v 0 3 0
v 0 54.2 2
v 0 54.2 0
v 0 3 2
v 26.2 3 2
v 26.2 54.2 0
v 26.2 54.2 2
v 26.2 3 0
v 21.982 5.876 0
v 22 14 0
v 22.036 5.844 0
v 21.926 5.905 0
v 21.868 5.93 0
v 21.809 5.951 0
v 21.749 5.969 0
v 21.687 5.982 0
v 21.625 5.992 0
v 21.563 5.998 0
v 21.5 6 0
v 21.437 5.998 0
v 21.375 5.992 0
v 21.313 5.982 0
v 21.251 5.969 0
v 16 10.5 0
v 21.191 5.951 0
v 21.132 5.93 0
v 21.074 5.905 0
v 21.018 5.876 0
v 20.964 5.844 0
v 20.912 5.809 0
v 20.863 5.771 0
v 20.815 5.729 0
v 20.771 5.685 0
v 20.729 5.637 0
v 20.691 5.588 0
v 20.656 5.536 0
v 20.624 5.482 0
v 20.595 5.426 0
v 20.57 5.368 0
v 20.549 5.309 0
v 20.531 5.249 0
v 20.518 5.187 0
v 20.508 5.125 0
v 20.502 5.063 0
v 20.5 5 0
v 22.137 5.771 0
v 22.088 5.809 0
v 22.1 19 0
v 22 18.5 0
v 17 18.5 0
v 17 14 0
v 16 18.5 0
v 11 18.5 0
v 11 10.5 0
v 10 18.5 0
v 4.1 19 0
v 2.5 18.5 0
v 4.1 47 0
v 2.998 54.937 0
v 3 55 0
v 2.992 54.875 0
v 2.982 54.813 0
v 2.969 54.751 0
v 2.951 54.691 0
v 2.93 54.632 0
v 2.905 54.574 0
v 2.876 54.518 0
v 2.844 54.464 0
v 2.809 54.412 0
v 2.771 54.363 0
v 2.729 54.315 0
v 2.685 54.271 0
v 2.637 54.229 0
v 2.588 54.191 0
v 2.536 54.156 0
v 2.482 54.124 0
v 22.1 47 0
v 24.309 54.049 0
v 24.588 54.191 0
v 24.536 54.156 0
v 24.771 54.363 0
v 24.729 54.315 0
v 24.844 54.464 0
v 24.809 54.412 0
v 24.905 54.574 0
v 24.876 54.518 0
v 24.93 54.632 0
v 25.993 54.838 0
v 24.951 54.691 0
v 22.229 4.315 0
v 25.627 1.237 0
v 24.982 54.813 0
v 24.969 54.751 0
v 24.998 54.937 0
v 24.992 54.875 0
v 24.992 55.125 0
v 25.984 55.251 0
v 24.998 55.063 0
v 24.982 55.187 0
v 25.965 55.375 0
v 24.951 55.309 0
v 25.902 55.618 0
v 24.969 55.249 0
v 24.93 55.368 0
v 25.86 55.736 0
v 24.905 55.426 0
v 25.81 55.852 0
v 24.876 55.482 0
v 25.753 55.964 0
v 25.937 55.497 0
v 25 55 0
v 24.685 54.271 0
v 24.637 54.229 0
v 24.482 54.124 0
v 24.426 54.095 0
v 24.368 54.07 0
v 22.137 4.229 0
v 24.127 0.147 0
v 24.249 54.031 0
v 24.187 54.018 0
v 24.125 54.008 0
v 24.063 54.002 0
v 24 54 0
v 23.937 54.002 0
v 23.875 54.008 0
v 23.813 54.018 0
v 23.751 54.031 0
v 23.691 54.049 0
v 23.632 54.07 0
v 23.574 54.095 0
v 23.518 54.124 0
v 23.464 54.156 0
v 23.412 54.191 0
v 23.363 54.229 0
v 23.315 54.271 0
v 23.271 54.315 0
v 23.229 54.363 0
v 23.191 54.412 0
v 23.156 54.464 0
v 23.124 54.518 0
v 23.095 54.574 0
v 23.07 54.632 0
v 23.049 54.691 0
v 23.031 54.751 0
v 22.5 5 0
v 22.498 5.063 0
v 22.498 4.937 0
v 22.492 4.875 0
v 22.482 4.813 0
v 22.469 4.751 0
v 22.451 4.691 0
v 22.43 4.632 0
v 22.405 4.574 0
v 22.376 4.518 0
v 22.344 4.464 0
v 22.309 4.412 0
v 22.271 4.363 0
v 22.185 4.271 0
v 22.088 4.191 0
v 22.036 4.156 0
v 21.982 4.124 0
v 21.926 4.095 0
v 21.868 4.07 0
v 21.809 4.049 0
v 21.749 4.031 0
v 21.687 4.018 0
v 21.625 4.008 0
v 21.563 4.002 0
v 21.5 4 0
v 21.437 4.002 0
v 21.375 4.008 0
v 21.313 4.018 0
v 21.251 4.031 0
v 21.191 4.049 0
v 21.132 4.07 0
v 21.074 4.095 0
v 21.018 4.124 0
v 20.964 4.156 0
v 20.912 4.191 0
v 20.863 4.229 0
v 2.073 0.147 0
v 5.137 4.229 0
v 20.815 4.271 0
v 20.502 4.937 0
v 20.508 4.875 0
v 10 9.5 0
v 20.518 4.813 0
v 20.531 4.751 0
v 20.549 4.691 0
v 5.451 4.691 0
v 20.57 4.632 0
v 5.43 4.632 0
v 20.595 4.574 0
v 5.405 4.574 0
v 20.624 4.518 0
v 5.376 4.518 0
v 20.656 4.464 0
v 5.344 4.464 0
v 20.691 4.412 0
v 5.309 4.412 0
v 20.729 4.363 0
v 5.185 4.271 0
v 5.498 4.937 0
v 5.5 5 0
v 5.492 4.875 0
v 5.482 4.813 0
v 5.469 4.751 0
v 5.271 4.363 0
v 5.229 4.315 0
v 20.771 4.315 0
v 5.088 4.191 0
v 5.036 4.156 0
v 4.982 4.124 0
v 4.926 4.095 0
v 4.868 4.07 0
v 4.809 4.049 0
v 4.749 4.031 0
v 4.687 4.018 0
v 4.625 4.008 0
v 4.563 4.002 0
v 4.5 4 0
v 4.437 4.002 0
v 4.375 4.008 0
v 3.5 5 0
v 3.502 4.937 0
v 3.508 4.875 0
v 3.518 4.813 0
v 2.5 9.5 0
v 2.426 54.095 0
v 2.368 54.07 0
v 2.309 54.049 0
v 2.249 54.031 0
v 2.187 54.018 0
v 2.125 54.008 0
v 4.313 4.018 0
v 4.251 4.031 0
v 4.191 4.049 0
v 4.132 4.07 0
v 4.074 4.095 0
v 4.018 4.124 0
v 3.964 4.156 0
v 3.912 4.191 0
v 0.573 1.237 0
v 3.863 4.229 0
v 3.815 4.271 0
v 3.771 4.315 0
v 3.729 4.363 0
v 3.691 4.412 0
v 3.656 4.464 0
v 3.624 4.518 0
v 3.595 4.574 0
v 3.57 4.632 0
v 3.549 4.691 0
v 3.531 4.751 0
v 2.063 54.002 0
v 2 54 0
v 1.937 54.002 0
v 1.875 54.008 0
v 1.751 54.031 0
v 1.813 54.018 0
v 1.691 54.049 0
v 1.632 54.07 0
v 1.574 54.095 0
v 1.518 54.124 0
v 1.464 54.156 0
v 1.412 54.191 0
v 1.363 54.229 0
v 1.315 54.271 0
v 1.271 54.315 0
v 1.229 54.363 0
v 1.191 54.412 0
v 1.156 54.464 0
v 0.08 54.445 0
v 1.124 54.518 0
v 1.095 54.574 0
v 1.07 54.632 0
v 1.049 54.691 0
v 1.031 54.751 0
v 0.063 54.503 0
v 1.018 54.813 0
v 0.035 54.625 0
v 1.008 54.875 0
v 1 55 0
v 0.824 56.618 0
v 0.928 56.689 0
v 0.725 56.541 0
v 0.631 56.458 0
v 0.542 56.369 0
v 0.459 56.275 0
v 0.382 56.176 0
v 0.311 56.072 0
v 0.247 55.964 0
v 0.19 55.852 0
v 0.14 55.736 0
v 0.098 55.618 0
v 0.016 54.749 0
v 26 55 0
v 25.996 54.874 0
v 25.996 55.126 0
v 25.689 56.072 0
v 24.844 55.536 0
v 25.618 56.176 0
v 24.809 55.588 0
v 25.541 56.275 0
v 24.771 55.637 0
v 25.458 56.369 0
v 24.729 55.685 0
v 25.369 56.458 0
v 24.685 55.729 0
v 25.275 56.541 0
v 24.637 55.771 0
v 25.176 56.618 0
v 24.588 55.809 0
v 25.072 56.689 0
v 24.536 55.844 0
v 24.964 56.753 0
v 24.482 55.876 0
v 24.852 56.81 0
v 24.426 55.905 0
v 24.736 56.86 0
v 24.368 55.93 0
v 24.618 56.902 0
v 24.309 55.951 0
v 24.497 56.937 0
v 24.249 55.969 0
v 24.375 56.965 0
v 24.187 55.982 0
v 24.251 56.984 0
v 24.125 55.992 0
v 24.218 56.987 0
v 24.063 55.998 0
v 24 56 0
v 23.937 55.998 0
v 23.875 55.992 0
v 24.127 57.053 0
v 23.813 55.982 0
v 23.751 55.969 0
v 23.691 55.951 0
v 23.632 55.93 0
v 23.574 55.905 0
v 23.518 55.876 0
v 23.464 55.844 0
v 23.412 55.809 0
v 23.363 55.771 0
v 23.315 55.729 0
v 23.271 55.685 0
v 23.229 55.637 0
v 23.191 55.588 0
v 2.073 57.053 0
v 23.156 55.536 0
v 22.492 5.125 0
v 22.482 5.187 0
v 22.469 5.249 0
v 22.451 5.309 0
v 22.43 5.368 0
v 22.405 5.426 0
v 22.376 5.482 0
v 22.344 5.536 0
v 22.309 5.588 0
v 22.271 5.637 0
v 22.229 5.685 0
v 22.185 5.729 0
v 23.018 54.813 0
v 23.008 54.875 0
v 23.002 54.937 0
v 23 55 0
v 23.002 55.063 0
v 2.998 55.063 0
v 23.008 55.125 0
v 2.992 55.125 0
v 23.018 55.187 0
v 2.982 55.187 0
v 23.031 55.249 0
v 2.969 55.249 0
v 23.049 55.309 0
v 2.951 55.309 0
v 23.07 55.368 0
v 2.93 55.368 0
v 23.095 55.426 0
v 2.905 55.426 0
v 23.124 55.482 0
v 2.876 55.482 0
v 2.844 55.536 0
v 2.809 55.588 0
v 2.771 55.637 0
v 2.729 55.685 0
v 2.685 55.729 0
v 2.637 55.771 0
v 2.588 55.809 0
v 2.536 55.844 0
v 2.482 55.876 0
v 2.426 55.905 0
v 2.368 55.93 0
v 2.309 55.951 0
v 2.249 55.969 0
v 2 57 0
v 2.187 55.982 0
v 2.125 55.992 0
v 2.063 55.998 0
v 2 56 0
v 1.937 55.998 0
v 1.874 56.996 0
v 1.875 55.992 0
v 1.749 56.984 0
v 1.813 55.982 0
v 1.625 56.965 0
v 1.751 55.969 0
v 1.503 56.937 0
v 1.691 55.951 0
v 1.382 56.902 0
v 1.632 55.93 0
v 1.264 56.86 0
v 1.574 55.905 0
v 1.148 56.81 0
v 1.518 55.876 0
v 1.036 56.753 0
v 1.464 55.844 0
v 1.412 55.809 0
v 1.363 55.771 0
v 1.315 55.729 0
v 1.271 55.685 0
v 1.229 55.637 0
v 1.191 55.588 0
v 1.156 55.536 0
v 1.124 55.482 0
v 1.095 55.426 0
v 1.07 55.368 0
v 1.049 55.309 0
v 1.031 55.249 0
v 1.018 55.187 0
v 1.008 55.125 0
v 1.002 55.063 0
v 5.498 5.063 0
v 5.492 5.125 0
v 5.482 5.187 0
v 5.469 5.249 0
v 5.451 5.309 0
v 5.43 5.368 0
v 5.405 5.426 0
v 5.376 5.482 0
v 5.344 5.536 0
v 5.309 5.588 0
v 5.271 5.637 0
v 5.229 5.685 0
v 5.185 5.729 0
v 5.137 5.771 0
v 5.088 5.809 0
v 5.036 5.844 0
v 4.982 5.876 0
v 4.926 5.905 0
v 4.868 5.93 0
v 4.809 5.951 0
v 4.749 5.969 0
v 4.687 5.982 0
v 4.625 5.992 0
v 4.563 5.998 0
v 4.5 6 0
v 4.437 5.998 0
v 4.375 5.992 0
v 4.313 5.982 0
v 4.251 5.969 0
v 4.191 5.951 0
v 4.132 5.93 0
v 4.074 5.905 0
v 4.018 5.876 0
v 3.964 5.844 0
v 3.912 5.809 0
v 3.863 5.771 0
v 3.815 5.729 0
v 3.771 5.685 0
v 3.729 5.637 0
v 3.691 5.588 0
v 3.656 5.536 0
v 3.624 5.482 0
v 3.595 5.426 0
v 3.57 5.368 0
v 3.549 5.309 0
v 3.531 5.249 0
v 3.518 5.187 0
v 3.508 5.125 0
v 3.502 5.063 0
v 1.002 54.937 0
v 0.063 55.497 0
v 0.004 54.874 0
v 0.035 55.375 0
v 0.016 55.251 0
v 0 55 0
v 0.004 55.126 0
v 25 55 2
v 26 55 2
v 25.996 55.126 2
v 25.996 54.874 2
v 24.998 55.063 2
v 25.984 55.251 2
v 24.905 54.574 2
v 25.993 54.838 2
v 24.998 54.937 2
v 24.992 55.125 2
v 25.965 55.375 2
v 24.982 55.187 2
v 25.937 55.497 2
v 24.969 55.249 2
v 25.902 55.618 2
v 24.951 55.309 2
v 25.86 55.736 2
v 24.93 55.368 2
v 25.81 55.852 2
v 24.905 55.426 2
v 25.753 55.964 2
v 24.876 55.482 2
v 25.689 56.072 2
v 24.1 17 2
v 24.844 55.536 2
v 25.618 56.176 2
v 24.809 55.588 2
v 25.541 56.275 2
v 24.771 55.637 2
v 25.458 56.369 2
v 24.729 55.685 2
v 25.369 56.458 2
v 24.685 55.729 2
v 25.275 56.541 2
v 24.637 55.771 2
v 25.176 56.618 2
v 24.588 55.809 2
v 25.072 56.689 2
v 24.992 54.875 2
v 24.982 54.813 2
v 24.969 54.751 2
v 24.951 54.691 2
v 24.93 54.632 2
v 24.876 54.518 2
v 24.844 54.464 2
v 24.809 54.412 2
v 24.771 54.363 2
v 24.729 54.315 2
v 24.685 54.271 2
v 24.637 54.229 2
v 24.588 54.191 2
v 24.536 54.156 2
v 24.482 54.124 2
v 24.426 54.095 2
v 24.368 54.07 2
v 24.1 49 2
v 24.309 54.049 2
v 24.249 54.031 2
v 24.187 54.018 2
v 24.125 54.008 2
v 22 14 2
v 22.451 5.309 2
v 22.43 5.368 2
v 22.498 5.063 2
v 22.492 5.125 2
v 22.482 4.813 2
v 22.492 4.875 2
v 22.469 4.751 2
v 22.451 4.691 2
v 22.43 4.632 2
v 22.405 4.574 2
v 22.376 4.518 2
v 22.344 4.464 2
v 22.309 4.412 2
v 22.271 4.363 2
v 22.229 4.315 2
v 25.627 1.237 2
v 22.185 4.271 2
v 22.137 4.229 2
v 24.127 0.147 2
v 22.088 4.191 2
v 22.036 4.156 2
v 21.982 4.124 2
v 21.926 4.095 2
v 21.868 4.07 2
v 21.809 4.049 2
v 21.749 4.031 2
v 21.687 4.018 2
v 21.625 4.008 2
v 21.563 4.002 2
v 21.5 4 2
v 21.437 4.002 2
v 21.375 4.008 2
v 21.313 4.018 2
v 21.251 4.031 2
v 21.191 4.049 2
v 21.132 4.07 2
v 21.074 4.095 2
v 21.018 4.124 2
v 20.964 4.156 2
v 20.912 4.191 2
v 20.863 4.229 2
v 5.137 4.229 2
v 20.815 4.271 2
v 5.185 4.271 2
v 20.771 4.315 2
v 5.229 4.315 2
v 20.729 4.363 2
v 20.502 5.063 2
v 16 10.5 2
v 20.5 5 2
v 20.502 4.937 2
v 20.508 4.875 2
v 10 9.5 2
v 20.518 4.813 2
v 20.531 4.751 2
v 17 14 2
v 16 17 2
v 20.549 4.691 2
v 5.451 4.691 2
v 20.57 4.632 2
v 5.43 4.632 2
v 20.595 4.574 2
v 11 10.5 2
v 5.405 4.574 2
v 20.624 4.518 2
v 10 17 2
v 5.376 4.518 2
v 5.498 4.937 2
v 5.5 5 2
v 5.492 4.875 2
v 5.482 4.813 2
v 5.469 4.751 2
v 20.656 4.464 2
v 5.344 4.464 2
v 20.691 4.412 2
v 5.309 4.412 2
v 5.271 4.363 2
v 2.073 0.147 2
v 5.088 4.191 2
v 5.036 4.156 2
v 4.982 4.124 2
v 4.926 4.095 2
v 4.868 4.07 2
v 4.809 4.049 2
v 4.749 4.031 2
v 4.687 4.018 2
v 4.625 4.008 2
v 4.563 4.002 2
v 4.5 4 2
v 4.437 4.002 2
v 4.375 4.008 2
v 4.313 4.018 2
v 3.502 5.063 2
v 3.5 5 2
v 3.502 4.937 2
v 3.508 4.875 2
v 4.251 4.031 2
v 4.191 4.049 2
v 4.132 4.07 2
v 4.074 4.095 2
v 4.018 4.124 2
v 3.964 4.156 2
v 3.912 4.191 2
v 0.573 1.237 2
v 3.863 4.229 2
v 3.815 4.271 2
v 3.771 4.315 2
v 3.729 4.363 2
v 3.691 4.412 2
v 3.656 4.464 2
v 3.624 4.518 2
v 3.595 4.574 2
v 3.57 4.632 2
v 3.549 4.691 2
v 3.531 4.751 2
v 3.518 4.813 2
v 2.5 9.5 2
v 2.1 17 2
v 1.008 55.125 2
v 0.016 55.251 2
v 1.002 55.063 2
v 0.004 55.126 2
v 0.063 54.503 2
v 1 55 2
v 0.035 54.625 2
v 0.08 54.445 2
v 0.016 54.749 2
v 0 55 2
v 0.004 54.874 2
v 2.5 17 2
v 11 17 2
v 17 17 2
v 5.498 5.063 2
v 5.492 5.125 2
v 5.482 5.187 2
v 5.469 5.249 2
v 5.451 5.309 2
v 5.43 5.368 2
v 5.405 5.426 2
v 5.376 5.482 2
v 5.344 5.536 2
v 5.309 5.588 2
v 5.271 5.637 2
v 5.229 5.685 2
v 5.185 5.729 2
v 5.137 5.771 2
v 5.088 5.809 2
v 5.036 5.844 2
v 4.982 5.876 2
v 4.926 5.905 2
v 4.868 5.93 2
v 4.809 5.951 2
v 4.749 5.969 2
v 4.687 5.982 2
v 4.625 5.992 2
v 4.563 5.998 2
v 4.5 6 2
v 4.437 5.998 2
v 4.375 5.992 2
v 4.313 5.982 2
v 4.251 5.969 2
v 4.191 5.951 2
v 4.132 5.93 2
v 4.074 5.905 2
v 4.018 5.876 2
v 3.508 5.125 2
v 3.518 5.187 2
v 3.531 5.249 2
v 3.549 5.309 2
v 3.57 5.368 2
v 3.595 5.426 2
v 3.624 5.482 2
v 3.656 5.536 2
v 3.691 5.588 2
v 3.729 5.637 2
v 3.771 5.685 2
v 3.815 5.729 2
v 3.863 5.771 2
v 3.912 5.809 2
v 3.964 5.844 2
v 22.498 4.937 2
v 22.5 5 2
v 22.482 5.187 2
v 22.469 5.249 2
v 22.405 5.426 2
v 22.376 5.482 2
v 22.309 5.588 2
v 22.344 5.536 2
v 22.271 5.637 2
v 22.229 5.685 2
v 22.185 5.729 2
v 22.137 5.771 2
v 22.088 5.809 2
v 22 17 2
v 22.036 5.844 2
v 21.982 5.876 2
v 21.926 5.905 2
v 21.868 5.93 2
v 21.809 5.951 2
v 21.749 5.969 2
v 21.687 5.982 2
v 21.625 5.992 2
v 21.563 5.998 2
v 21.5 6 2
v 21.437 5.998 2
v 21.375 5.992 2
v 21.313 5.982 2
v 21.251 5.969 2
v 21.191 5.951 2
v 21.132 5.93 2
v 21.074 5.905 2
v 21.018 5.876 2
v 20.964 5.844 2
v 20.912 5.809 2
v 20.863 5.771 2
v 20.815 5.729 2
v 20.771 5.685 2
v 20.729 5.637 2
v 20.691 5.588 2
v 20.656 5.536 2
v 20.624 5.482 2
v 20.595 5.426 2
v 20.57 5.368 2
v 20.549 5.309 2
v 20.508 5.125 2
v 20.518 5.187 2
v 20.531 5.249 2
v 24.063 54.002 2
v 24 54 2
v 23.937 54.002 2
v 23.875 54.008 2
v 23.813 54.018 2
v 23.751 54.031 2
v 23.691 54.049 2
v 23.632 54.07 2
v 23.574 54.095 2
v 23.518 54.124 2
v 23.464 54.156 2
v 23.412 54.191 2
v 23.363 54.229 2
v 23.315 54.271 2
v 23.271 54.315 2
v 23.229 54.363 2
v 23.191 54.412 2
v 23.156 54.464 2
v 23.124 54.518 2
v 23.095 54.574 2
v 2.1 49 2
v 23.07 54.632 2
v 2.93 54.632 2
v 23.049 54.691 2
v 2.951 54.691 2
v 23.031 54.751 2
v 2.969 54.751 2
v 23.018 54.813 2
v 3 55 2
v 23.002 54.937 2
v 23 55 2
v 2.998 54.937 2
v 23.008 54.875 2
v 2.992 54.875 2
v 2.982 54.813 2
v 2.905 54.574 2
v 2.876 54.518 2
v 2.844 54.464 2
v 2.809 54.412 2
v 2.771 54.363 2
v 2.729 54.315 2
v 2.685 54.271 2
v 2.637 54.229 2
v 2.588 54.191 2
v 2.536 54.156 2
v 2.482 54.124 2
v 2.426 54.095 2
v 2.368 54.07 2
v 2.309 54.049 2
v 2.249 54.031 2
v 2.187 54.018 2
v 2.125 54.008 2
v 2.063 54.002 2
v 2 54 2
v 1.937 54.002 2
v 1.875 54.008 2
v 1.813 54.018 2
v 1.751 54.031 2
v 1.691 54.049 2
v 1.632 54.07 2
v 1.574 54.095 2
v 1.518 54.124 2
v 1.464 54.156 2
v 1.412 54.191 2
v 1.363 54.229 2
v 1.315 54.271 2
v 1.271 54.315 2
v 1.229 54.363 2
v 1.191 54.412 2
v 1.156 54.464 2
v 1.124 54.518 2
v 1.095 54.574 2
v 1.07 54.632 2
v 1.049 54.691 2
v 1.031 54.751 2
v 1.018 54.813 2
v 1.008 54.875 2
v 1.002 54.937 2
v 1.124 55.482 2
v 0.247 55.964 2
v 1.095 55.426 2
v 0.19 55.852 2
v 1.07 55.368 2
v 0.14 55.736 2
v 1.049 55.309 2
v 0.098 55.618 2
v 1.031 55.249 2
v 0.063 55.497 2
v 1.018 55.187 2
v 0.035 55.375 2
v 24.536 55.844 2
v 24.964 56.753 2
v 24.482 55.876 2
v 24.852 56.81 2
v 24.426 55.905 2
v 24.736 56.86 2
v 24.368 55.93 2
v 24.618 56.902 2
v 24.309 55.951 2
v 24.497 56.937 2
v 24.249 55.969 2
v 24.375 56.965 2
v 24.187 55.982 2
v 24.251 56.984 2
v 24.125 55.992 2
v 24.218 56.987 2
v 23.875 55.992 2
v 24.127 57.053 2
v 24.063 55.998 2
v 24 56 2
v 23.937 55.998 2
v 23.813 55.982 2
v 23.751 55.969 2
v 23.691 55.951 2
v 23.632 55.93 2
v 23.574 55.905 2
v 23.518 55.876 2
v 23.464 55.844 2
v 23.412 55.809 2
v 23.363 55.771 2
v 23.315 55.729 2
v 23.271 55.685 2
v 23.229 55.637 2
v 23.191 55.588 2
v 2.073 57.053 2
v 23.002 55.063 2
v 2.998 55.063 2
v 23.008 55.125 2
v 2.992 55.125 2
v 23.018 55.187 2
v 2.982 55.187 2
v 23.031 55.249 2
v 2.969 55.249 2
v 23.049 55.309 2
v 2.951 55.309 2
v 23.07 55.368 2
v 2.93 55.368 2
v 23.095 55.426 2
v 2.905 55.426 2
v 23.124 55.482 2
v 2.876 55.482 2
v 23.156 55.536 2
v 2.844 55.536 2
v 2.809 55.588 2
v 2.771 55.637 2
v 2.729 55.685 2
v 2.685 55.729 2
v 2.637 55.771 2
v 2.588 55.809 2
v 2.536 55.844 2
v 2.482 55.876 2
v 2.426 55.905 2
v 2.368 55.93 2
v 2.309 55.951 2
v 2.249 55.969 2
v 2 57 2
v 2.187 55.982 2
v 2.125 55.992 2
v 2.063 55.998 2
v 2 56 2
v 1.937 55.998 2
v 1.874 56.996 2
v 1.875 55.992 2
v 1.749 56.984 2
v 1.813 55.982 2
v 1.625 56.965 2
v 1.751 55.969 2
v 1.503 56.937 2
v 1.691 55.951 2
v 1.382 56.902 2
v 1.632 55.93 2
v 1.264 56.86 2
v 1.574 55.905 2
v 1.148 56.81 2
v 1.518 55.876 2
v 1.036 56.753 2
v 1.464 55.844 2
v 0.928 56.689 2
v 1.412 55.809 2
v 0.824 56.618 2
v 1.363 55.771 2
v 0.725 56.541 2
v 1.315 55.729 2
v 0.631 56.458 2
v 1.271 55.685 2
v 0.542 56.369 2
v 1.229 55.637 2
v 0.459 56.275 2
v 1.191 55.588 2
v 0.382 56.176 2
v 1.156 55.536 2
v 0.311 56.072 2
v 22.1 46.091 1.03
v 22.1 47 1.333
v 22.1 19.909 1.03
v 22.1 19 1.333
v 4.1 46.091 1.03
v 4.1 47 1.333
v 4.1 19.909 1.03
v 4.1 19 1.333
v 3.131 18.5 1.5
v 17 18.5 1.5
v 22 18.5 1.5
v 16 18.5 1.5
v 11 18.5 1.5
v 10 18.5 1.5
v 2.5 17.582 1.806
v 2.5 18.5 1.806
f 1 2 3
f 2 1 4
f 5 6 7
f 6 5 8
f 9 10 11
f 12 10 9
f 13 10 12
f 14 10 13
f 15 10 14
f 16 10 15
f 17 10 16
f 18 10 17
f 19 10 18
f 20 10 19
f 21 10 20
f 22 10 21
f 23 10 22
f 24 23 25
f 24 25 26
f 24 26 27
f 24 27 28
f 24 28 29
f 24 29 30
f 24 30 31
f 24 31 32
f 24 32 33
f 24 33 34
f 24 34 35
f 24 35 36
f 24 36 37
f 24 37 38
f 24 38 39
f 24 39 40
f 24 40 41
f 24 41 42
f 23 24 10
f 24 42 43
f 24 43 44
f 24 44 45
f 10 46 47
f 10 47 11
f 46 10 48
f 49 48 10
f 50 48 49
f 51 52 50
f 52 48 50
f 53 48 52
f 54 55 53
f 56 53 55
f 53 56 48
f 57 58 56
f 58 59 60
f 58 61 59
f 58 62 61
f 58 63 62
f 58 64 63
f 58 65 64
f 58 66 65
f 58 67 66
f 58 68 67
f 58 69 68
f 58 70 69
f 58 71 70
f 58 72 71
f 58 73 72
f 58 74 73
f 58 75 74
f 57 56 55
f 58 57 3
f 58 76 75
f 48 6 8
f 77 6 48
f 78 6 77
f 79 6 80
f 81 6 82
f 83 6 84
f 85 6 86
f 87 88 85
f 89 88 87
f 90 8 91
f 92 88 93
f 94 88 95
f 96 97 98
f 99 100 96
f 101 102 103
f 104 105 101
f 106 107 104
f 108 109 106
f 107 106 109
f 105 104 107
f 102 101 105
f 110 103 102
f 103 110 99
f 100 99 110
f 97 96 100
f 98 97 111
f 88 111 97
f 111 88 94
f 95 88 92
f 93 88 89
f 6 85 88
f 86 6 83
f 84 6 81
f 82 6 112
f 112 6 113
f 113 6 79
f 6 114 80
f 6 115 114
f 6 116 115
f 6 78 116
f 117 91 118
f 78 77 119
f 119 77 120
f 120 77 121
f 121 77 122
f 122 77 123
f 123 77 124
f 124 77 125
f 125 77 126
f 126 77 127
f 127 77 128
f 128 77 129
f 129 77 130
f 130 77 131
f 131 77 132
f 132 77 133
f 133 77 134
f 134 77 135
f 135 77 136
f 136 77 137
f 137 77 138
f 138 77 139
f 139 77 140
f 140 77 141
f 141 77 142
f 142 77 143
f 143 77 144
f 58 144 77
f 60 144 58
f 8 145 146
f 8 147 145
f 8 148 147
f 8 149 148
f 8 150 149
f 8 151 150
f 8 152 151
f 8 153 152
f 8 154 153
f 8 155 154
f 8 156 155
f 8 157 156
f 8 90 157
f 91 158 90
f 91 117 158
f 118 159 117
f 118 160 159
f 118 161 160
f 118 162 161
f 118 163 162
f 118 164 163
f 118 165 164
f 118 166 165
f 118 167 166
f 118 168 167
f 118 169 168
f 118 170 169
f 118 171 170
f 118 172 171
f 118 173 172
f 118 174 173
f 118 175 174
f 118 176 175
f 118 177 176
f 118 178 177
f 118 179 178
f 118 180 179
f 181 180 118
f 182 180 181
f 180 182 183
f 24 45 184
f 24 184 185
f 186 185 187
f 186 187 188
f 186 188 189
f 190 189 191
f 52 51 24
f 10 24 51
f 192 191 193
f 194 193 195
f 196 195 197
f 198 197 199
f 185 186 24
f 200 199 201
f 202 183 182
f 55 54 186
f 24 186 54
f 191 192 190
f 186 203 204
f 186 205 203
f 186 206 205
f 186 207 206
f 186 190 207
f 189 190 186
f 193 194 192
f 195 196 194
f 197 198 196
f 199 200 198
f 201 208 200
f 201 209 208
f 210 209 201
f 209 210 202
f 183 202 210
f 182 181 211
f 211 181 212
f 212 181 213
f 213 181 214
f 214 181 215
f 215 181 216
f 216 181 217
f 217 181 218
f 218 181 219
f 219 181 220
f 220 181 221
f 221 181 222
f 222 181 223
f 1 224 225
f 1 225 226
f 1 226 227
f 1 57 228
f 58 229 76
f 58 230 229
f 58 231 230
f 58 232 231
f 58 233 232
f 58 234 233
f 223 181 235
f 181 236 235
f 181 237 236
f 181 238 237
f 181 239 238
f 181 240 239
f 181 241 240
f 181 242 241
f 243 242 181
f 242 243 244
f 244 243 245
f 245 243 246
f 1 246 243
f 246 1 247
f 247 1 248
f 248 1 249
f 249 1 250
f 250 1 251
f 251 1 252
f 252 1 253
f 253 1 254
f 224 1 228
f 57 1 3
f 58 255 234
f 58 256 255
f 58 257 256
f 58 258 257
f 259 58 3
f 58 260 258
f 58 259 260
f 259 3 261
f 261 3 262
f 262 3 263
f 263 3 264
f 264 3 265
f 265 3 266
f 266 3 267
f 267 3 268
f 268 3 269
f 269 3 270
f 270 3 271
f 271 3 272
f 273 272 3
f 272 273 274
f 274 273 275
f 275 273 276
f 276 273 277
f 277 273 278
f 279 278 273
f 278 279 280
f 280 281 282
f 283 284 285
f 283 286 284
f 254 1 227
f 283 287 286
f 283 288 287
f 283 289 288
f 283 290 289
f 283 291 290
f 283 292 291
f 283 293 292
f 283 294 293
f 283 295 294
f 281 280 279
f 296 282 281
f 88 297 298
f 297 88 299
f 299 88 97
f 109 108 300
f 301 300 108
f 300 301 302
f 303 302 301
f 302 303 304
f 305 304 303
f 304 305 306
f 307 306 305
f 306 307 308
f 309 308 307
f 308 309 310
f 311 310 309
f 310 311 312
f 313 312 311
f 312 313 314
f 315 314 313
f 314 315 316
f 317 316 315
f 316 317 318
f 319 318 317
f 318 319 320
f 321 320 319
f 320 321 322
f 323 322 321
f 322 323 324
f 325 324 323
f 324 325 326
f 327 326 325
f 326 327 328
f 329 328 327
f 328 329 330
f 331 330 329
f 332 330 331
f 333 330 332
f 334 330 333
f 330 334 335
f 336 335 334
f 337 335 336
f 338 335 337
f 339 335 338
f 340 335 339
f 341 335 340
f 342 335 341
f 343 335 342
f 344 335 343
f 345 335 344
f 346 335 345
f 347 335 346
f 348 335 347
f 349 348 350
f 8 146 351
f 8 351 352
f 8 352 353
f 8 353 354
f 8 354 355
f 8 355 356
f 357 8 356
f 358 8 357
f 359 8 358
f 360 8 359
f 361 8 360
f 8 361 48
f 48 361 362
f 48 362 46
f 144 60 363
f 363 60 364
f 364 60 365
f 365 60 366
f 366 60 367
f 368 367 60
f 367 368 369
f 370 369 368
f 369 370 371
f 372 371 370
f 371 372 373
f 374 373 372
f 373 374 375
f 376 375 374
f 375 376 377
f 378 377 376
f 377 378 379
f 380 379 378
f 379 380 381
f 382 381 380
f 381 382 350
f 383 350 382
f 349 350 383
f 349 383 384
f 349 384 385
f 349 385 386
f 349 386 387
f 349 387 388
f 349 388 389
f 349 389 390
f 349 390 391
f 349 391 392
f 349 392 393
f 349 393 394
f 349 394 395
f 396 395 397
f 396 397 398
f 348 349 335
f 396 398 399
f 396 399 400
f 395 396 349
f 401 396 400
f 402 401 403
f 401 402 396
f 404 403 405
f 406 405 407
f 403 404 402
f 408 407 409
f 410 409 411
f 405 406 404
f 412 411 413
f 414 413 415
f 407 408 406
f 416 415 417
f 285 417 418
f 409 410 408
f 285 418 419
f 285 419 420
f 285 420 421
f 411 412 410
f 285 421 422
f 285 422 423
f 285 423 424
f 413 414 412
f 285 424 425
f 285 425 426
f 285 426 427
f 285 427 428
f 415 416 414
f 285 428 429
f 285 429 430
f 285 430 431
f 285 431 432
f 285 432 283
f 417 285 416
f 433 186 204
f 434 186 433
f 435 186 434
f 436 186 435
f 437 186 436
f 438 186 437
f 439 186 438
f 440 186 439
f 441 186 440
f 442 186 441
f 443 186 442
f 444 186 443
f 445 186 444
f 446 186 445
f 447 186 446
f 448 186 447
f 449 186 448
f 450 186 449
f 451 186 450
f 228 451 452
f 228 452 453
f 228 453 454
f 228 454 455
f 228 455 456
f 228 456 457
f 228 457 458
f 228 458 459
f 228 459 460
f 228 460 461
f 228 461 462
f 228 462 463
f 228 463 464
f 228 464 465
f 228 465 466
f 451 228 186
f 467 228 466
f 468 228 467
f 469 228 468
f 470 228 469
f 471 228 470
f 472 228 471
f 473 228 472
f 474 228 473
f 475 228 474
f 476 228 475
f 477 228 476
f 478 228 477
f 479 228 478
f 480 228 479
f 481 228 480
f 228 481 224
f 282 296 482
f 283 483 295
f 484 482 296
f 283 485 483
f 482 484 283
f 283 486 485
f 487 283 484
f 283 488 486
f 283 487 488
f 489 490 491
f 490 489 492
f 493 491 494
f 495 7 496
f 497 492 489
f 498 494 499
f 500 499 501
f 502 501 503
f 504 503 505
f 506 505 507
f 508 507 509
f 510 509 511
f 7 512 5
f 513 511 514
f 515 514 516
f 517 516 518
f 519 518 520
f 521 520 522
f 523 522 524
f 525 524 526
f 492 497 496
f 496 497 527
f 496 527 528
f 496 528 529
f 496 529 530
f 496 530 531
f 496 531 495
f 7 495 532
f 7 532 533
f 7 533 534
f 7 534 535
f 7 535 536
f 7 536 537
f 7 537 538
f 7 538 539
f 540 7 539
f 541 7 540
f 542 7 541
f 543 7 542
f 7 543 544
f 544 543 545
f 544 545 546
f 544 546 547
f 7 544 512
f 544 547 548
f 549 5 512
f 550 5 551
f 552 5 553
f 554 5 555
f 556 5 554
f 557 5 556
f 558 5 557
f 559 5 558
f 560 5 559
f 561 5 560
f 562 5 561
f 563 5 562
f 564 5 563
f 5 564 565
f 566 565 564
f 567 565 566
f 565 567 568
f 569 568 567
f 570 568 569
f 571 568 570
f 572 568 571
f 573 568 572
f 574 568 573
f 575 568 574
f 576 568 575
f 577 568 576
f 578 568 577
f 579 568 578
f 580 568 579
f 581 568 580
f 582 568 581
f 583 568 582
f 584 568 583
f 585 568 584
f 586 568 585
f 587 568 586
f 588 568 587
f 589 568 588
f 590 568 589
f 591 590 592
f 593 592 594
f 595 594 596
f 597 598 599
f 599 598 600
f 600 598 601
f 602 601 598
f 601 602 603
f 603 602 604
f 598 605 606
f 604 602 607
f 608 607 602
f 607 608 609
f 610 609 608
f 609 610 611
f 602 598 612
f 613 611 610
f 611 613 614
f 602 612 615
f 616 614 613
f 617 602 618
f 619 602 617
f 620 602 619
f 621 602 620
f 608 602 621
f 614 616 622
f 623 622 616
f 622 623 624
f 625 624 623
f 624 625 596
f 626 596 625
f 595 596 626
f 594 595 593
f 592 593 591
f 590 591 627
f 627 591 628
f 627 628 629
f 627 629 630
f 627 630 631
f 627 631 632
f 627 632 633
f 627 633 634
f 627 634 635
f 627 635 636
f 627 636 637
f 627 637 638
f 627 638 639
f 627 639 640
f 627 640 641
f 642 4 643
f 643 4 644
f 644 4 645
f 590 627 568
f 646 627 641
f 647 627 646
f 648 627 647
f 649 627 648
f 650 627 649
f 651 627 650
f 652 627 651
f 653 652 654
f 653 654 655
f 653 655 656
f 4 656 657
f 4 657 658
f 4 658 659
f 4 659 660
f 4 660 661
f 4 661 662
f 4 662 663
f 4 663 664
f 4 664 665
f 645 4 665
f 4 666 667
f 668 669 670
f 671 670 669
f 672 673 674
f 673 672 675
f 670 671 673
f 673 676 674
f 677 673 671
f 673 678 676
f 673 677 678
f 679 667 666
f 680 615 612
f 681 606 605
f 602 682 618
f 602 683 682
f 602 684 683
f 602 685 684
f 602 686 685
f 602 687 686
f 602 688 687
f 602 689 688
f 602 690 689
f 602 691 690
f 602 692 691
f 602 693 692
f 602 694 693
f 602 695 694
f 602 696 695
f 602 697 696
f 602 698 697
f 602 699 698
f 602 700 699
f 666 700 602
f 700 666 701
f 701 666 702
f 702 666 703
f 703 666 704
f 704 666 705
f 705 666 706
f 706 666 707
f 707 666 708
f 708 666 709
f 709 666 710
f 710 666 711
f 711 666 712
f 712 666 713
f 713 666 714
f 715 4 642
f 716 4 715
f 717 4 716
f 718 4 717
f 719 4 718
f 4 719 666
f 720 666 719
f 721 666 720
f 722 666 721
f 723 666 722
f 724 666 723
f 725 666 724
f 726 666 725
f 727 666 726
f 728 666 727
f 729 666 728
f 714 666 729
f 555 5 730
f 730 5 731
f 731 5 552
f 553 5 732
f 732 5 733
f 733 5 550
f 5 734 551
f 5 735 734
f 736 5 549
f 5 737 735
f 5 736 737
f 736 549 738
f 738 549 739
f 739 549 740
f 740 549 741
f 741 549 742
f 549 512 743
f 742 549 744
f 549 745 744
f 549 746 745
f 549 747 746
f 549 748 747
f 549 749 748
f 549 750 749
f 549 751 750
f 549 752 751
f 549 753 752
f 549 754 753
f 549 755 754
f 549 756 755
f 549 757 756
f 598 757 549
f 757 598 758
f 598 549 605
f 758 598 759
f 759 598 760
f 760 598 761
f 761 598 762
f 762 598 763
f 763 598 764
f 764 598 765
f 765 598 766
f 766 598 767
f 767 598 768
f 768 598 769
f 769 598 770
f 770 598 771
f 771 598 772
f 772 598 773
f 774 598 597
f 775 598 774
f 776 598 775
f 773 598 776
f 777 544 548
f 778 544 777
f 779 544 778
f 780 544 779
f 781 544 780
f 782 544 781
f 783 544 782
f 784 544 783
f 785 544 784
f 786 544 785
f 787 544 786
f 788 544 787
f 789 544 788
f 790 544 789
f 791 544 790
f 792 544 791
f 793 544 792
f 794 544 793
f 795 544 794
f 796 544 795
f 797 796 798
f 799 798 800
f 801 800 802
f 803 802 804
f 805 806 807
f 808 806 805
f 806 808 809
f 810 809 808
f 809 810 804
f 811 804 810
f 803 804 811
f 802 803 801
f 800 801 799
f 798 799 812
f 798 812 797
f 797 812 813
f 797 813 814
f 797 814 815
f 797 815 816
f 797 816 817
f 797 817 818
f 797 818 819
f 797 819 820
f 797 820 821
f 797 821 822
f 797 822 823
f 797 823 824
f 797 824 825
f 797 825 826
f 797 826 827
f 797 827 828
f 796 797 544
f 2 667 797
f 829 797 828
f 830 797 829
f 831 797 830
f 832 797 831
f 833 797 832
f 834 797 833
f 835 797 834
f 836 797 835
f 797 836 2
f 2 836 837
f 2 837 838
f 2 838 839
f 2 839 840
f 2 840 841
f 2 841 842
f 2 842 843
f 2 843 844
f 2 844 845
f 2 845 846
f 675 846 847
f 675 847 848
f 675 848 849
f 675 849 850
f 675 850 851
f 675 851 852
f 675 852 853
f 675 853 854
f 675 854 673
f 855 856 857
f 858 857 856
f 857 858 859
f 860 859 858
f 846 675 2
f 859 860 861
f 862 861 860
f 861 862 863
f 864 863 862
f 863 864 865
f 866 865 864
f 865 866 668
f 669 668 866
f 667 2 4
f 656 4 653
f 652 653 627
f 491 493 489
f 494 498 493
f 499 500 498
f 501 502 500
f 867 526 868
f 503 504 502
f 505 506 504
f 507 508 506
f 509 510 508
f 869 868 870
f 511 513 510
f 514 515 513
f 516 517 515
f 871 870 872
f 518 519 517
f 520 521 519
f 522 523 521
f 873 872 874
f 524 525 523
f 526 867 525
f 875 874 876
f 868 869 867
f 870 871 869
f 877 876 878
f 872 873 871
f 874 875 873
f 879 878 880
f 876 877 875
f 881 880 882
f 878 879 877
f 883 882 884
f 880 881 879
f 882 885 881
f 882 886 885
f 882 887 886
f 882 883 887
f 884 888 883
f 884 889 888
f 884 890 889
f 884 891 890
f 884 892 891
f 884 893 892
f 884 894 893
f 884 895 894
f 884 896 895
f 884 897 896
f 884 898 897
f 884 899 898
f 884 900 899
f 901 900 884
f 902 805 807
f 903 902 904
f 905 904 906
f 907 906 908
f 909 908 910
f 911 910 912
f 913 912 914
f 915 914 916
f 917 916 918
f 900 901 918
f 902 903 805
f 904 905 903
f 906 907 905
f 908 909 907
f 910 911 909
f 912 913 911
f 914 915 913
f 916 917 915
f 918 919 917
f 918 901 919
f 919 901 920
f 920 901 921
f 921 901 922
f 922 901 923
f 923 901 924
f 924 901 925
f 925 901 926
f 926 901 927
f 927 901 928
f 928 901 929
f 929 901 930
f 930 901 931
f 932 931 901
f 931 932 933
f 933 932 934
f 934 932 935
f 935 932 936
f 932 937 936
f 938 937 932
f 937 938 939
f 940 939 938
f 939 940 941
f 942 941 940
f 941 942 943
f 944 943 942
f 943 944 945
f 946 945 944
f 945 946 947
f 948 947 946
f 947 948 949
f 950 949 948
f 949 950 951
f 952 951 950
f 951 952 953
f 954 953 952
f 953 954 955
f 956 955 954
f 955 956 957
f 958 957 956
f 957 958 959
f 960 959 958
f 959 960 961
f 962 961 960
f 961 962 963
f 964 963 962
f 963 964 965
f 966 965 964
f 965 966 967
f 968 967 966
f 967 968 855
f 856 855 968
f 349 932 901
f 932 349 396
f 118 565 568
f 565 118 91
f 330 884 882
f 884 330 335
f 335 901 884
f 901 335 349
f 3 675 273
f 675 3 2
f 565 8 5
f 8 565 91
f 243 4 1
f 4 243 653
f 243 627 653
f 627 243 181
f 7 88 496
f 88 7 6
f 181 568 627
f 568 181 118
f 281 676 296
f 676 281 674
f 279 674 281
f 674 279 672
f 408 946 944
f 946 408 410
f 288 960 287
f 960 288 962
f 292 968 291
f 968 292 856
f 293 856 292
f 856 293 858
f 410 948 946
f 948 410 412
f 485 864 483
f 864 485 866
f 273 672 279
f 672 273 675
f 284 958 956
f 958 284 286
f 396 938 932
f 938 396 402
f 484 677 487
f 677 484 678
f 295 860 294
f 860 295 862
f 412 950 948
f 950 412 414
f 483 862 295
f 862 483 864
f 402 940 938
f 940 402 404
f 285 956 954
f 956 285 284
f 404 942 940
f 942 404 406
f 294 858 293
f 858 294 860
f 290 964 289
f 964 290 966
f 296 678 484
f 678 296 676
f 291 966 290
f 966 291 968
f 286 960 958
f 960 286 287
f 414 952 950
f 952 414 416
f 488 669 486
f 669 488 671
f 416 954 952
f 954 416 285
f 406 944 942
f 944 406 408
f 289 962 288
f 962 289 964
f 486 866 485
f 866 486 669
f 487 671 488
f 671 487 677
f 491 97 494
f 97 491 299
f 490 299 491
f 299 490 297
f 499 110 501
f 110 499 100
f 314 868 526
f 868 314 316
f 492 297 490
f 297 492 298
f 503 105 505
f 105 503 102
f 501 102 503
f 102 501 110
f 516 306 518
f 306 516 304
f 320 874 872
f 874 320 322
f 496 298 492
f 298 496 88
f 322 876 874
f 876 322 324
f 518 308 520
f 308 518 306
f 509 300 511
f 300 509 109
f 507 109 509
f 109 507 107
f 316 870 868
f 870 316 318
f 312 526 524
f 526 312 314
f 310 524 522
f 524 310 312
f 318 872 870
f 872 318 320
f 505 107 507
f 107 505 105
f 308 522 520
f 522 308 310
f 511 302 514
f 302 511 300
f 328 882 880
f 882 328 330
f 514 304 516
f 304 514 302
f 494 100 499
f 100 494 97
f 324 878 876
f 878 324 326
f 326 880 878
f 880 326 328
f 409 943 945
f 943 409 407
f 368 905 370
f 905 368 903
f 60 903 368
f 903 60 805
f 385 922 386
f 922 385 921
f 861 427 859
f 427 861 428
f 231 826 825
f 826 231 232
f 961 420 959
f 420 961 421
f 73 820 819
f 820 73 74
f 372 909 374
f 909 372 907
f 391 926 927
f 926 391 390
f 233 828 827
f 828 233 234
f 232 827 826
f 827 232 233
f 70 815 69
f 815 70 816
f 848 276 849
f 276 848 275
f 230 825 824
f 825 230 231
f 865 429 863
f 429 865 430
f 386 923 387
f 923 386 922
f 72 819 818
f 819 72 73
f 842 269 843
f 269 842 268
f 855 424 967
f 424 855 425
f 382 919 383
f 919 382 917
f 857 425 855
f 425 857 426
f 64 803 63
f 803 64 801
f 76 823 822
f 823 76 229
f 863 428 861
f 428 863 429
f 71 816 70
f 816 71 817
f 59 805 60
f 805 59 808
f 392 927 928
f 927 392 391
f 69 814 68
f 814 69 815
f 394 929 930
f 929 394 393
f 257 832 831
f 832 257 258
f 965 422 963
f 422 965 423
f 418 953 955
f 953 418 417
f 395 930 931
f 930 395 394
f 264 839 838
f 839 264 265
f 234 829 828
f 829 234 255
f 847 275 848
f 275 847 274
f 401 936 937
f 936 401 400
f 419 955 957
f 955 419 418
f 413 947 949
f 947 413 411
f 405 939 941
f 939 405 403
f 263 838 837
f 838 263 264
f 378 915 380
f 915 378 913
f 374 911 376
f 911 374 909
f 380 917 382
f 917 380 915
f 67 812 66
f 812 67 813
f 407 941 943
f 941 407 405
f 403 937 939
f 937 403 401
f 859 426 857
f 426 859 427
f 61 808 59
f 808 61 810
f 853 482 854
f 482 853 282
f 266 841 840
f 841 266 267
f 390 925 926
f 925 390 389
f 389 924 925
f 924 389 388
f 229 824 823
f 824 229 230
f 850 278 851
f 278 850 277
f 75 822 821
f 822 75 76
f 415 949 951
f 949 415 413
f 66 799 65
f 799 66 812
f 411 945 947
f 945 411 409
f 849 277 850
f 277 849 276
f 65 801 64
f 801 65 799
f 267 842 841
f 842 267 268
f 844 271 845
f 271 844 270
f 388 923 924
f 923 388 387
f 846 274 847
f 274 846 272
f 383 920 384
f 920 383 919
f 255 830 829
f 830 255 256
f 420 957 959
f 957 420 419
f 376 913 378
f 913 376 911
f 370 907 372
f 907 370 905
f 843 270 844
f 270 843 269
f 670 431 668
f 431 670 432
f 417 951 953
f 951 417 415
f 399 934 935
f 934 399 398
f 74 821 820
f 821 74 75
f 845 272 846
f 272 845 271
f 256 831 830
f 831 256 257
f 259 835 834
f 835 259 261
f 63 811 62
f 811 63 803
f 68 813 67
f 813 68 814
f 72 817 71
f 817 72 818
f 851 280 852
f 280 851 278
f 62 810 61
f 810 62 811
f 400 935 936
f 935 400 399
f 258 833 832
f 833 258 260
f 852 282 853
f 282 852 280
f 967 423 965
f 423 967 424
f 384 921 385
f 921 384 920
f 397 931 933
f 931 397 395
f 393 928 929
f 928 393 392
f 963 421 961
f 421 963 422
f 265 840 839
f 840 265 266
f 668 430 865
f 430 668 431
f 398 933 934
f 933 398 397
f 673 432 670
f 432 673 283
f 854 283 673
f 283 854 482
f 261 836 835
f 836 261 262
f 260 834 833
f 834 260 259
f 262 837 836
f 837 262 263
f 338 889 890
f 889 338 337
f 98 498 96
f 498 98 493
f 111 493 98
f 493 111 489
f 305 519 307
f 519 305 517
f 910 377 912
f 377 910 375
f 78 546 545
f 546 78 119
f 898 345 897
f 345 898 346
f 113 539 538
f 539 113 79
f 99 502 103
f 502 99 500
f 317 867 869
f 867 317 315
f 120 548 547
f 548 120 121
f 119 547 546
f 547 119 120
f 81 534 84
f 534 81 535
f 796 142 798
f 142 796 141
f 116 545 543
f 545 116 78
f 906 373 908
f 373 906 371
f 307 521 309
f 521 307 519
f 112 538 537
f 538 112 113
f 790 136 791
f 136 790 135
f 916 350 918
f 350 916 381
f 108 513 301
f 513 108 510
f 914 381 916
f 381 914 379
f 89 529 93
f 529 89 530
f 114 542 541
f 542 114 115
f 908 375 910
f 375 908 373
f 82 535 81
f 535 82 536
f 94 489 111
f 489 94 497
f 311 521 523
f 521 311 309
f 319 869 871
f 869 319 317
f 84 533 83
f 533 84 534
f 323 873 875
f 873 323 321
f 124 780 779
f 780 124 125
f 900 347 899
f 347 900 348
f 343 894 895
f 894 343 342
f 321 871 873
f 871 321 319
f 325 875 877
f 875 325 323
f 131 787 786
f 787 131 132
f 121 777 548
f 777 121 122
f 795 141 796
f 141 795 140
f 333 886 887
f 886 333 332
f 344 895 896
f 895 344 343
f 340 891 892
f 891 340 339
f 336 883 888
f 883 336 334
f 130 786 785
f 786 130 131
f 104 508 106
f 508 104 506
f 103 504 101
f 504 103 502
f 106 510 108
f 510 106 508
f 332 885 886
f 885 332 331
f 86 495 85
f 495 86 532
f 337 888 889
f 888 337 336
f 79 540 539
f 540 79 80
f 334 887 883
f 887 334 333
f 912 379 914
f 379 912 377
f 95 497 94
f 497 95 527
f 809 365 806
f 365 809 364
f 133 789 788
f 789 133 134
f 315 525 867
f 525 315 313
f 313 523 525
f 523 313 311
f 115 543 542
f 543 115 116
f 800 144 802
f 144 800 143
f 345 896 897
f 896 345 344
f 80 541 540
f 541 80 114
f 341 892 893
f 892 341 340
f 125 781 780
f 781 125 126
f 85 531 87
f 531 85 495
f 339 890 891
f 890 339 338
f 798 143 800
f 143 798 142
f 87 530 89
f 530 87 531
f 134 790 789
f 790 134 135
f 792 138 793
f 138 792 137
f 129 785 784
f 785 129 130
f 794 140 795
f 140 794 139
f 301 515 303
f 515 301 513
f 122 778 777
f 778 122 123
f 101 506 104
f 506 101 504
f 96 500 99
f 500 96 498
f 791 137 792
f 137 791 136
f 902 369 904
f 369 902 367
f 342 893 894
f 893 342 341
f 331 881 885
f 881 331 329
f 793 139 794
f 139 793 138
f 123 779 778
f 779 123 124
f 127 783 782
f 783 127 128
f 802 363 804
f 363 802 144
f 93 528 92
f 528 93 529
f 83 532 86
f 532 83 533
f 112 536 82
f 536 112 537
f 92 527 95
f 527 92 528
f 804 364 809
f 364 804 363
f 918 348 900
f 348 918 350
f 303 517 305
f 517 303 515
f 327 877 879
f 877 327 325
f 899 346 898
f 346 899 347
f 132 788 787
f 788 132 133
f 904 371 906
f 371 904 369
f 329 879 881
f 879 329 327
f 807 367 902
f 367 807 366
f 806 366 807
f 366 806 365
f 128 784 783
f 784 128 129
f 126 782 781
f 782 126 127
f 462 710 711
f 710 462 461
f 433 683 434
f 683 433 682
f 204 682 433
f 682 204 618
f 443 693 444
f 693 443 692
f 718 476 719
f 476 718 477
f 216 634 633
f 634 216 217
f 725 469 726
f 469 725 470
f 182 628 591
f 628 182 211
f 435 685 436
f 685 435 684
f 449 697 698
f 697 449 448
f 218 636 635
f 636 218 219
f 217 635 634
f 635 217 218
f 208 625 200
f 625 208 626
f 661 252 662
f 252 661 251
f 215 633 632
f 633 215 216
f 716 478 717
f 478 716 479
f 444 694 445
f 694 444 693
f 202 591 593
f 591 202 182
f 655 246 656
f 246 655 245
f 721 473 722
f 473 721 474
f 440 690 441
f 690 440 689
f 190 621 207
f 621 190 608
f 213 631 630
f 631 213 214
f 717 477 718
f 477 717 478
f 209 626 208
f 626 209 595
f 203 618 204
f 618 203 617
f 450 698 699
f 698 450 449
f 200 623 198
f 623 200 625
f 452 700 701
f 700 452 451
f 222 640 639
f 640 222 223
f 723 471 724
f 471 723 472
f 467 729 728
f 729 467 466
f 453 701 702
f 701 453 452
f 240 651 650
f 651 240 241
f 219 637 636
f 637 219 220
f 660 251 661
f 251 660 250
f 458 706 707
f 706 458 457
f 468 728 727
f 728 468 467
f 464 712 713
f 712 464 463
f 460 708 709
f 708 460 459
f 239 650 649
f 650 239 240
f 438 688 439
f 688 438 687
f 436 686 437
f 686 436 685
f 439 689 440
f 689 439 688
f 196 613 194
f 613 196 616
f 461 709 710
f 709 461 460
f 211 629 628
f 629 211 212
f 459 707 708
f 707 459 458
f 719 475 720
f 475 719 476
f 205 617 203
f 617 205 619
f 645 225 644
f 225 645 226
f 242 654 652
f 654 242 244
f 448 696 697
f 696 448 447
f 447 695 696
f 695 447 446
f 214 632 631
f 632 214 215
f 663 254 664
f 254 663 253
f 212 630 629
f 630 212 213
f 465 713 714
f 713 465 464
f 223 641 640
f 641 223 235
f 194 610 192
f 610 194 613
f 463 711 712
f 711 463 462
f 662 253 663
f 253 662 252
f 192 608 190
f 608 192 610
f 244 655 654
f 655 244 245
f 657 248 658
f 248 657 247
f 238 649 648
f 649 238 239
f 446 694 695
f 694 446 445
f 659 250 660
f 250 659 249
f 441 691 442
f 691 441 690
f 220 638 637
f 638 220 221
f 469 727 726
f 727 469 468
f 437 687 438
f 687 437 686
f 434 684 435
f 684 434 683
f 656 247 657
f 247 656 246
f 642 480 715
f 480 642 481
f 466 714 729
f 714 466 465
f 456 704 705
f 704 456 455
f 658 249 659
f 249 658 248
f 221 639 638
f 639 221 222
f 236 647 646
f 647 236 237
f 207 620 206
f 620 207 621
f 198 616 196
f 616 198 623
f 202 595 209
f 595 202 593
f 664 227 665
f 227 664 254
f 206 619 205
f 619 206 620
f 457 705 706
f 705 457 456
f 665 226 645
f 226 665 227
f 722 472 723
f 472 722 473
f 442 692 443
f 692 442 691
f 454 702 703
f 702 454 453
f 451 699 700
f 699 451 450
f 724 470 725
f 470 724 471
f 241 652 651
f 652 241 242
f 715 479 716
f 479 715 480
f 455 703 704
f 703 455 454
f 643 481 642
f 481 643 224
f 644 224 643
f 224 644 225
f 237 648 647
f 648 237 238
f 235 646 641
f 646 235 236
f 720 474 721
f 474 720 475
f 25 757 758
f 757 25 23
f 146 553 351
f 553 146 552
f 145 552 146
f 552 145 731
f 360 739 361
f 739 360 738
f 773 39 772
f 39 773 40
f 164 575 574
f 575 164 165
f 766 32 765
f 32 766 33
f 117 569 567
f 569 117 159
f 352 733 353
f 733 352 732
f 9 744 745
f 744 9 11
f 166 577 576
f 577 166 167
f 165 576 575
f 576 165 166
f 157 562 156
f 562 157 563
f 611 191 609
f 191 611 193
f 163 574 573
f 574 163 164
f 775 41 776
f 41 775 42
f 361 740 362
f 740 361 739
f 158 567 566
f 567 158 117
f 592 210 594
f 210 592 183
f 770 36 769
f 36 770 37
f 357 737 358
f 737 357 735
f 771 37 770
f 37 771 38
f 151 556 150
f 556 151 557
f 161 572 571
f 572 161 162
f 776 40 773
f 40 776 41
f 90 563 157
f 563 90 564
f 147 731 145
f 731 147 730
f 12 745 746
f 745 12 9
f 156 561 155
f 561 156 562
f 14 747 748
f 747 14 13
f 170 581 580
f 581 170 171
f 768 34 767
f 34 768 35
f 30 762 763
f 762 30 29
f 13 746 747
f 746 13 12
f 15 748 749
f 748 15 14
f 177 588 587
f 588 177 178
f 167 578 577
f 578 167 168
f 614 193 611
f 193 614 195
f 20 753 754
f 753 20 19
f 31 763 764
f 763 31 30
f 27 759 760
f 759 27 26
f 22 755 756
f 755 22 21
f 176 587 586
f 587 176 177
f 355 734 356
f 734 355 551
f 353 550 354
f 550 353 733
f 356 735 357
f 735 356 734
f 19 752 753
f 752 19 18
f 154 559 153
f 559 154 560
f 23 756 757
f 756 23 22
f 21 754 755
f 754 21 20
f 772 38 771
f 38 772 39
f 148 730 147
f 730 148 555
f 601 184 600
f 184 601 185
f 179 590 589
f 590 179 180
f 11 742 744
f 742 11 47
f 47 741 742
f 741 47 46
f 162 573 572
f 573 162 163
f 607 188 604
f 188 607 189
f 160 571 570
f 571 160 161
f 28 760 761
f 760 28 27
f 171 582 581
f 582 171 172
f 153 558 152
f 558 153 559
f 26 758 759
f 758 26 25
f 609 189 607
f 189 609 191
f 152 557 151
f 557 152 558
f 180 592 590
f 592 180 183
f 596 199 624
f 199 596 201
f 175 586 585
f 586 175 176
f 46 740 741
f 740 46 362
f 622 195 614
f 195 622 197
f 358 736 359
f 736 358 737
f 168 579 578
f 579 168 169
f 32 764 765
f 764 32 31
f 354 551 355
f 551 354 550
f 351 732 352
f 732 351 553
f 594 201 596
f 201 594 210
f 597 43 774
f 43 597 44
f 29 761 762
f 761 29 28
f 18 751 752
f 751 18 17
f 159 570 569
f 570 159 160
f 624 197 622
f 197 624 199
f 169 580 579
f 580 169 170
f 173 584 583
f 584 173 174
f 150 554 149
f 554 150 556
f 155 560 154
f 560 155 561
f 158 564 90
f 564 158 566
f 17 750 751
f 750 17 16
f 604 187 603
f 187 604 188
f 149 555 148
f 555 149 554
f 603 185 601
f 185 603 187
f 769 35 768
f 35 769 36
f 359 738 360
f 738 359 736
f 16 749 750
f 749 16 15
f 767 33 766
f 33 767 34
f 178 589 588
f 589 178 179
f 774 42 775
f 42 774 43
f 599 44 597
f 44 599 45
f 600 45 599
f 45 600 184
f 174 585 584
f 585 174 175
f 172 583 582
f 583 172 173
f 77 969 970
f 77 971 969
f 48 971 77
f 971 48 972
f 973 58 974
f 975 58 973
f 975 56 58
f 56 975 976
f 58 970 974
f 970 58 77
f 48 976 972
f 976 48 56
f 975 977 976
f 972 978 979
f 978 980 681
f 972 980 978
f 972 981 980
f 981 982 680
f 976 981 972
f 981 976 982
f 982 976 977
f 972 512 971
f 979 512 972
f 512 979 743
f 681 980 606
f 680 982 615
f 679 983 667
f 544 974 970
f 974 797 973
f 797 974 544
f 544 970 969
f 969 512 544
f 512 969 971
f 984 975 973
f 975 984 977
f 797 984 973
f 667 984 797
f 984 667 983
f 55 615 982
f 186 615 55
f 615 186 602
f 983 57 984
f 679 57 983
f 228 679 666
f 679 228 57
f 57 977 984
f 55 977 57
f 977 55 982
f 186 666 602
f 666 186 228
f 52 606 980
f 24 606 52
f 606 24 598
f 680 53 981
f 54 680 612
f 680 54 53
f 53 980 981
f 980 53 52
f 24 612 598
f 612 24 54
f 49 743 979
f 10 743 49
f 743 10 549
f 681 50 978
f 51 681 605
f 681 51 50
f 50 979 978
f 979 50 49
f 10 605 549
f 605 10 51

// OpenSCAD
/****************************************************************
* title: Alti case TS-ESP32-S3
* author: Boris du Reau
* version: 1.0
* date: 26/12/2024
* 
* Description: 
* Howto use it:
* Modify the variables values so that it fits to your rocket tube 
* then just click on "compile and render" 
* Note that all units ar metrics
*****************************************************************/

/* adjust variables here */ 

/* Do not modify anything after that unless you know what you are doing*/

module roundedcube(xdim, ydim, zdim,rdim) {
    hull(){
        translate([rdim, rdim,0]) cylinder(r=rdim, h=zdim);
        translate([xdim-rdim, rdim,0]) cylinder(r=rdim, h=zdim);
        translate([rdim, ydim -rdim,0]) cylinder(r=rdim, h=zdim);
        translate([xdim-rdim, ydim-rdim,0]) cylinder(r=rdim, h=zdim);
    }
}


module box() {
difference() {
    union() {
        difference() {
            union() {
                translate([0,0,-2])roundedcube(23 +(2*1.6), 54+ (2*1.6), 12,3); 
                difference() {
                    #translate ([(23 +(2*1.6))/2,54+ (2*1.6),4]) #cylinder(r=26/2, h=6, $fn=100);
                    #translate ([(23 +(2*1.6))/2,54+ (2*1.6),4]) #cylinder(r=16/2, h=6, $fn=100);
                }
            } 
            #translate ([1.6,1.6,-2]) roundedcube(23, 54, 10,2);  
        }     
        
        //case holes
        //#translate([0+2,2,4])cylinder(r=2, h=12, center = true, $fn =100);
        //#translate([0+28,2,4])cylinder(r=2, h=12, center = true, $fn =100);
        #translate([0+2,58-2,4])cylinder(r=2, h=12, center = true, $fn =100);
        #translate([0+24,58-2,4])cylinder(r=2, h=12, center = true, $fn =100); 
        
        //board holes
        #translate([0+2+2.5,2+3,6])cylinder(r=2, h=7, center = true, $fn =100);
        #translate([0+2+1.5+18,2+3,6])cylinder(r=2, h=7, center = true, $fn =100);
    }
    //case holes
    //#translate([0+2,2,0])cylinder(r=2/2, h=30, center = true, $fn =100);
    //#translate([0+28,2,0])cylinder(r=2/2, h=30, center = true, $fn =100);
    #translate([0+2,58-2,0])cylinder(r=2/2, h=30, center = true, $fn =100);
    #translate([0+24,58-2,0])cylinder(r=2/2, h=30, center = true, $fn =100);
    //board holes
    #translate([0+2+2.5, 2+3,5])cylinder(r=2/2, h=7, center = true, $fn =100);
    #translate([0+2+1.5+18, 2+3,5])cylinder(r=2/2, h=7, center = true, $fn =100);
    
    //usb port
    #translate([(23 +(2*1.6))/2,1,0])cube([10,2,4], center = true);
    //sensor hole
    #translate([20,25,4])cylinder(r=3, h=12, center = true, $fn =100);
}
    
}

module cover() {
difference() {
    union() {
        difference() {
            translate([0,0,0])roundedcube(23 +(2*1.6), 54+ (2*1.6), 2,3);     
        }
        //case holes
        //#translate([0+2,2,1])cylinder(r=2, h=2, center = true, $fn =100);
        //#translate([0+28,2,1])cylinder(r=2, h=2, center = true, $fn =100);
        #translate([0+2,55,1])cylinder(r=2, h=2, center = true, $fn =100);
        #translate([0+24,55,1])cylinder(r=2, h=2, center = true, $fn =100);
    }
    
    //case holes
    #translate([0+2,55,0])cylinder(r=2/2, h=30, center = true, $fn =100);
    #translate([0+24,55,0])cylinder(r=2/2, h=30, center = true, $fn =100);
    //board holes
    #translate([0+2+2.5,2+3,0])cylinder(r=2/2, h=30, center = true, $fn =100);
    #translate([0+2+1.5+18,2+3,0])cylinder(r=2/2, h=30, center = true, $fn =100);
    
    //window
    #translate([(23 +(2*1.6))/2,17.5+(31/2),2]) cube([18, 28, 4], center = true);
    #translate([(23 +(2*1.6))/2,17.5+(31/2),0])resize([22,32])rotate([0,0,45])cylinder(h=2, r1= 20, r2 = 32, $fn=4);
    
    #translate([2.5,9.5,0]) cube([7.5,9,4]);
    #translate([11,10.5,0]) cube([5,8,4]);
    #translate([17,14,0]) cube([5,4.5,4]);
} 
    
}

//box();
cover();
